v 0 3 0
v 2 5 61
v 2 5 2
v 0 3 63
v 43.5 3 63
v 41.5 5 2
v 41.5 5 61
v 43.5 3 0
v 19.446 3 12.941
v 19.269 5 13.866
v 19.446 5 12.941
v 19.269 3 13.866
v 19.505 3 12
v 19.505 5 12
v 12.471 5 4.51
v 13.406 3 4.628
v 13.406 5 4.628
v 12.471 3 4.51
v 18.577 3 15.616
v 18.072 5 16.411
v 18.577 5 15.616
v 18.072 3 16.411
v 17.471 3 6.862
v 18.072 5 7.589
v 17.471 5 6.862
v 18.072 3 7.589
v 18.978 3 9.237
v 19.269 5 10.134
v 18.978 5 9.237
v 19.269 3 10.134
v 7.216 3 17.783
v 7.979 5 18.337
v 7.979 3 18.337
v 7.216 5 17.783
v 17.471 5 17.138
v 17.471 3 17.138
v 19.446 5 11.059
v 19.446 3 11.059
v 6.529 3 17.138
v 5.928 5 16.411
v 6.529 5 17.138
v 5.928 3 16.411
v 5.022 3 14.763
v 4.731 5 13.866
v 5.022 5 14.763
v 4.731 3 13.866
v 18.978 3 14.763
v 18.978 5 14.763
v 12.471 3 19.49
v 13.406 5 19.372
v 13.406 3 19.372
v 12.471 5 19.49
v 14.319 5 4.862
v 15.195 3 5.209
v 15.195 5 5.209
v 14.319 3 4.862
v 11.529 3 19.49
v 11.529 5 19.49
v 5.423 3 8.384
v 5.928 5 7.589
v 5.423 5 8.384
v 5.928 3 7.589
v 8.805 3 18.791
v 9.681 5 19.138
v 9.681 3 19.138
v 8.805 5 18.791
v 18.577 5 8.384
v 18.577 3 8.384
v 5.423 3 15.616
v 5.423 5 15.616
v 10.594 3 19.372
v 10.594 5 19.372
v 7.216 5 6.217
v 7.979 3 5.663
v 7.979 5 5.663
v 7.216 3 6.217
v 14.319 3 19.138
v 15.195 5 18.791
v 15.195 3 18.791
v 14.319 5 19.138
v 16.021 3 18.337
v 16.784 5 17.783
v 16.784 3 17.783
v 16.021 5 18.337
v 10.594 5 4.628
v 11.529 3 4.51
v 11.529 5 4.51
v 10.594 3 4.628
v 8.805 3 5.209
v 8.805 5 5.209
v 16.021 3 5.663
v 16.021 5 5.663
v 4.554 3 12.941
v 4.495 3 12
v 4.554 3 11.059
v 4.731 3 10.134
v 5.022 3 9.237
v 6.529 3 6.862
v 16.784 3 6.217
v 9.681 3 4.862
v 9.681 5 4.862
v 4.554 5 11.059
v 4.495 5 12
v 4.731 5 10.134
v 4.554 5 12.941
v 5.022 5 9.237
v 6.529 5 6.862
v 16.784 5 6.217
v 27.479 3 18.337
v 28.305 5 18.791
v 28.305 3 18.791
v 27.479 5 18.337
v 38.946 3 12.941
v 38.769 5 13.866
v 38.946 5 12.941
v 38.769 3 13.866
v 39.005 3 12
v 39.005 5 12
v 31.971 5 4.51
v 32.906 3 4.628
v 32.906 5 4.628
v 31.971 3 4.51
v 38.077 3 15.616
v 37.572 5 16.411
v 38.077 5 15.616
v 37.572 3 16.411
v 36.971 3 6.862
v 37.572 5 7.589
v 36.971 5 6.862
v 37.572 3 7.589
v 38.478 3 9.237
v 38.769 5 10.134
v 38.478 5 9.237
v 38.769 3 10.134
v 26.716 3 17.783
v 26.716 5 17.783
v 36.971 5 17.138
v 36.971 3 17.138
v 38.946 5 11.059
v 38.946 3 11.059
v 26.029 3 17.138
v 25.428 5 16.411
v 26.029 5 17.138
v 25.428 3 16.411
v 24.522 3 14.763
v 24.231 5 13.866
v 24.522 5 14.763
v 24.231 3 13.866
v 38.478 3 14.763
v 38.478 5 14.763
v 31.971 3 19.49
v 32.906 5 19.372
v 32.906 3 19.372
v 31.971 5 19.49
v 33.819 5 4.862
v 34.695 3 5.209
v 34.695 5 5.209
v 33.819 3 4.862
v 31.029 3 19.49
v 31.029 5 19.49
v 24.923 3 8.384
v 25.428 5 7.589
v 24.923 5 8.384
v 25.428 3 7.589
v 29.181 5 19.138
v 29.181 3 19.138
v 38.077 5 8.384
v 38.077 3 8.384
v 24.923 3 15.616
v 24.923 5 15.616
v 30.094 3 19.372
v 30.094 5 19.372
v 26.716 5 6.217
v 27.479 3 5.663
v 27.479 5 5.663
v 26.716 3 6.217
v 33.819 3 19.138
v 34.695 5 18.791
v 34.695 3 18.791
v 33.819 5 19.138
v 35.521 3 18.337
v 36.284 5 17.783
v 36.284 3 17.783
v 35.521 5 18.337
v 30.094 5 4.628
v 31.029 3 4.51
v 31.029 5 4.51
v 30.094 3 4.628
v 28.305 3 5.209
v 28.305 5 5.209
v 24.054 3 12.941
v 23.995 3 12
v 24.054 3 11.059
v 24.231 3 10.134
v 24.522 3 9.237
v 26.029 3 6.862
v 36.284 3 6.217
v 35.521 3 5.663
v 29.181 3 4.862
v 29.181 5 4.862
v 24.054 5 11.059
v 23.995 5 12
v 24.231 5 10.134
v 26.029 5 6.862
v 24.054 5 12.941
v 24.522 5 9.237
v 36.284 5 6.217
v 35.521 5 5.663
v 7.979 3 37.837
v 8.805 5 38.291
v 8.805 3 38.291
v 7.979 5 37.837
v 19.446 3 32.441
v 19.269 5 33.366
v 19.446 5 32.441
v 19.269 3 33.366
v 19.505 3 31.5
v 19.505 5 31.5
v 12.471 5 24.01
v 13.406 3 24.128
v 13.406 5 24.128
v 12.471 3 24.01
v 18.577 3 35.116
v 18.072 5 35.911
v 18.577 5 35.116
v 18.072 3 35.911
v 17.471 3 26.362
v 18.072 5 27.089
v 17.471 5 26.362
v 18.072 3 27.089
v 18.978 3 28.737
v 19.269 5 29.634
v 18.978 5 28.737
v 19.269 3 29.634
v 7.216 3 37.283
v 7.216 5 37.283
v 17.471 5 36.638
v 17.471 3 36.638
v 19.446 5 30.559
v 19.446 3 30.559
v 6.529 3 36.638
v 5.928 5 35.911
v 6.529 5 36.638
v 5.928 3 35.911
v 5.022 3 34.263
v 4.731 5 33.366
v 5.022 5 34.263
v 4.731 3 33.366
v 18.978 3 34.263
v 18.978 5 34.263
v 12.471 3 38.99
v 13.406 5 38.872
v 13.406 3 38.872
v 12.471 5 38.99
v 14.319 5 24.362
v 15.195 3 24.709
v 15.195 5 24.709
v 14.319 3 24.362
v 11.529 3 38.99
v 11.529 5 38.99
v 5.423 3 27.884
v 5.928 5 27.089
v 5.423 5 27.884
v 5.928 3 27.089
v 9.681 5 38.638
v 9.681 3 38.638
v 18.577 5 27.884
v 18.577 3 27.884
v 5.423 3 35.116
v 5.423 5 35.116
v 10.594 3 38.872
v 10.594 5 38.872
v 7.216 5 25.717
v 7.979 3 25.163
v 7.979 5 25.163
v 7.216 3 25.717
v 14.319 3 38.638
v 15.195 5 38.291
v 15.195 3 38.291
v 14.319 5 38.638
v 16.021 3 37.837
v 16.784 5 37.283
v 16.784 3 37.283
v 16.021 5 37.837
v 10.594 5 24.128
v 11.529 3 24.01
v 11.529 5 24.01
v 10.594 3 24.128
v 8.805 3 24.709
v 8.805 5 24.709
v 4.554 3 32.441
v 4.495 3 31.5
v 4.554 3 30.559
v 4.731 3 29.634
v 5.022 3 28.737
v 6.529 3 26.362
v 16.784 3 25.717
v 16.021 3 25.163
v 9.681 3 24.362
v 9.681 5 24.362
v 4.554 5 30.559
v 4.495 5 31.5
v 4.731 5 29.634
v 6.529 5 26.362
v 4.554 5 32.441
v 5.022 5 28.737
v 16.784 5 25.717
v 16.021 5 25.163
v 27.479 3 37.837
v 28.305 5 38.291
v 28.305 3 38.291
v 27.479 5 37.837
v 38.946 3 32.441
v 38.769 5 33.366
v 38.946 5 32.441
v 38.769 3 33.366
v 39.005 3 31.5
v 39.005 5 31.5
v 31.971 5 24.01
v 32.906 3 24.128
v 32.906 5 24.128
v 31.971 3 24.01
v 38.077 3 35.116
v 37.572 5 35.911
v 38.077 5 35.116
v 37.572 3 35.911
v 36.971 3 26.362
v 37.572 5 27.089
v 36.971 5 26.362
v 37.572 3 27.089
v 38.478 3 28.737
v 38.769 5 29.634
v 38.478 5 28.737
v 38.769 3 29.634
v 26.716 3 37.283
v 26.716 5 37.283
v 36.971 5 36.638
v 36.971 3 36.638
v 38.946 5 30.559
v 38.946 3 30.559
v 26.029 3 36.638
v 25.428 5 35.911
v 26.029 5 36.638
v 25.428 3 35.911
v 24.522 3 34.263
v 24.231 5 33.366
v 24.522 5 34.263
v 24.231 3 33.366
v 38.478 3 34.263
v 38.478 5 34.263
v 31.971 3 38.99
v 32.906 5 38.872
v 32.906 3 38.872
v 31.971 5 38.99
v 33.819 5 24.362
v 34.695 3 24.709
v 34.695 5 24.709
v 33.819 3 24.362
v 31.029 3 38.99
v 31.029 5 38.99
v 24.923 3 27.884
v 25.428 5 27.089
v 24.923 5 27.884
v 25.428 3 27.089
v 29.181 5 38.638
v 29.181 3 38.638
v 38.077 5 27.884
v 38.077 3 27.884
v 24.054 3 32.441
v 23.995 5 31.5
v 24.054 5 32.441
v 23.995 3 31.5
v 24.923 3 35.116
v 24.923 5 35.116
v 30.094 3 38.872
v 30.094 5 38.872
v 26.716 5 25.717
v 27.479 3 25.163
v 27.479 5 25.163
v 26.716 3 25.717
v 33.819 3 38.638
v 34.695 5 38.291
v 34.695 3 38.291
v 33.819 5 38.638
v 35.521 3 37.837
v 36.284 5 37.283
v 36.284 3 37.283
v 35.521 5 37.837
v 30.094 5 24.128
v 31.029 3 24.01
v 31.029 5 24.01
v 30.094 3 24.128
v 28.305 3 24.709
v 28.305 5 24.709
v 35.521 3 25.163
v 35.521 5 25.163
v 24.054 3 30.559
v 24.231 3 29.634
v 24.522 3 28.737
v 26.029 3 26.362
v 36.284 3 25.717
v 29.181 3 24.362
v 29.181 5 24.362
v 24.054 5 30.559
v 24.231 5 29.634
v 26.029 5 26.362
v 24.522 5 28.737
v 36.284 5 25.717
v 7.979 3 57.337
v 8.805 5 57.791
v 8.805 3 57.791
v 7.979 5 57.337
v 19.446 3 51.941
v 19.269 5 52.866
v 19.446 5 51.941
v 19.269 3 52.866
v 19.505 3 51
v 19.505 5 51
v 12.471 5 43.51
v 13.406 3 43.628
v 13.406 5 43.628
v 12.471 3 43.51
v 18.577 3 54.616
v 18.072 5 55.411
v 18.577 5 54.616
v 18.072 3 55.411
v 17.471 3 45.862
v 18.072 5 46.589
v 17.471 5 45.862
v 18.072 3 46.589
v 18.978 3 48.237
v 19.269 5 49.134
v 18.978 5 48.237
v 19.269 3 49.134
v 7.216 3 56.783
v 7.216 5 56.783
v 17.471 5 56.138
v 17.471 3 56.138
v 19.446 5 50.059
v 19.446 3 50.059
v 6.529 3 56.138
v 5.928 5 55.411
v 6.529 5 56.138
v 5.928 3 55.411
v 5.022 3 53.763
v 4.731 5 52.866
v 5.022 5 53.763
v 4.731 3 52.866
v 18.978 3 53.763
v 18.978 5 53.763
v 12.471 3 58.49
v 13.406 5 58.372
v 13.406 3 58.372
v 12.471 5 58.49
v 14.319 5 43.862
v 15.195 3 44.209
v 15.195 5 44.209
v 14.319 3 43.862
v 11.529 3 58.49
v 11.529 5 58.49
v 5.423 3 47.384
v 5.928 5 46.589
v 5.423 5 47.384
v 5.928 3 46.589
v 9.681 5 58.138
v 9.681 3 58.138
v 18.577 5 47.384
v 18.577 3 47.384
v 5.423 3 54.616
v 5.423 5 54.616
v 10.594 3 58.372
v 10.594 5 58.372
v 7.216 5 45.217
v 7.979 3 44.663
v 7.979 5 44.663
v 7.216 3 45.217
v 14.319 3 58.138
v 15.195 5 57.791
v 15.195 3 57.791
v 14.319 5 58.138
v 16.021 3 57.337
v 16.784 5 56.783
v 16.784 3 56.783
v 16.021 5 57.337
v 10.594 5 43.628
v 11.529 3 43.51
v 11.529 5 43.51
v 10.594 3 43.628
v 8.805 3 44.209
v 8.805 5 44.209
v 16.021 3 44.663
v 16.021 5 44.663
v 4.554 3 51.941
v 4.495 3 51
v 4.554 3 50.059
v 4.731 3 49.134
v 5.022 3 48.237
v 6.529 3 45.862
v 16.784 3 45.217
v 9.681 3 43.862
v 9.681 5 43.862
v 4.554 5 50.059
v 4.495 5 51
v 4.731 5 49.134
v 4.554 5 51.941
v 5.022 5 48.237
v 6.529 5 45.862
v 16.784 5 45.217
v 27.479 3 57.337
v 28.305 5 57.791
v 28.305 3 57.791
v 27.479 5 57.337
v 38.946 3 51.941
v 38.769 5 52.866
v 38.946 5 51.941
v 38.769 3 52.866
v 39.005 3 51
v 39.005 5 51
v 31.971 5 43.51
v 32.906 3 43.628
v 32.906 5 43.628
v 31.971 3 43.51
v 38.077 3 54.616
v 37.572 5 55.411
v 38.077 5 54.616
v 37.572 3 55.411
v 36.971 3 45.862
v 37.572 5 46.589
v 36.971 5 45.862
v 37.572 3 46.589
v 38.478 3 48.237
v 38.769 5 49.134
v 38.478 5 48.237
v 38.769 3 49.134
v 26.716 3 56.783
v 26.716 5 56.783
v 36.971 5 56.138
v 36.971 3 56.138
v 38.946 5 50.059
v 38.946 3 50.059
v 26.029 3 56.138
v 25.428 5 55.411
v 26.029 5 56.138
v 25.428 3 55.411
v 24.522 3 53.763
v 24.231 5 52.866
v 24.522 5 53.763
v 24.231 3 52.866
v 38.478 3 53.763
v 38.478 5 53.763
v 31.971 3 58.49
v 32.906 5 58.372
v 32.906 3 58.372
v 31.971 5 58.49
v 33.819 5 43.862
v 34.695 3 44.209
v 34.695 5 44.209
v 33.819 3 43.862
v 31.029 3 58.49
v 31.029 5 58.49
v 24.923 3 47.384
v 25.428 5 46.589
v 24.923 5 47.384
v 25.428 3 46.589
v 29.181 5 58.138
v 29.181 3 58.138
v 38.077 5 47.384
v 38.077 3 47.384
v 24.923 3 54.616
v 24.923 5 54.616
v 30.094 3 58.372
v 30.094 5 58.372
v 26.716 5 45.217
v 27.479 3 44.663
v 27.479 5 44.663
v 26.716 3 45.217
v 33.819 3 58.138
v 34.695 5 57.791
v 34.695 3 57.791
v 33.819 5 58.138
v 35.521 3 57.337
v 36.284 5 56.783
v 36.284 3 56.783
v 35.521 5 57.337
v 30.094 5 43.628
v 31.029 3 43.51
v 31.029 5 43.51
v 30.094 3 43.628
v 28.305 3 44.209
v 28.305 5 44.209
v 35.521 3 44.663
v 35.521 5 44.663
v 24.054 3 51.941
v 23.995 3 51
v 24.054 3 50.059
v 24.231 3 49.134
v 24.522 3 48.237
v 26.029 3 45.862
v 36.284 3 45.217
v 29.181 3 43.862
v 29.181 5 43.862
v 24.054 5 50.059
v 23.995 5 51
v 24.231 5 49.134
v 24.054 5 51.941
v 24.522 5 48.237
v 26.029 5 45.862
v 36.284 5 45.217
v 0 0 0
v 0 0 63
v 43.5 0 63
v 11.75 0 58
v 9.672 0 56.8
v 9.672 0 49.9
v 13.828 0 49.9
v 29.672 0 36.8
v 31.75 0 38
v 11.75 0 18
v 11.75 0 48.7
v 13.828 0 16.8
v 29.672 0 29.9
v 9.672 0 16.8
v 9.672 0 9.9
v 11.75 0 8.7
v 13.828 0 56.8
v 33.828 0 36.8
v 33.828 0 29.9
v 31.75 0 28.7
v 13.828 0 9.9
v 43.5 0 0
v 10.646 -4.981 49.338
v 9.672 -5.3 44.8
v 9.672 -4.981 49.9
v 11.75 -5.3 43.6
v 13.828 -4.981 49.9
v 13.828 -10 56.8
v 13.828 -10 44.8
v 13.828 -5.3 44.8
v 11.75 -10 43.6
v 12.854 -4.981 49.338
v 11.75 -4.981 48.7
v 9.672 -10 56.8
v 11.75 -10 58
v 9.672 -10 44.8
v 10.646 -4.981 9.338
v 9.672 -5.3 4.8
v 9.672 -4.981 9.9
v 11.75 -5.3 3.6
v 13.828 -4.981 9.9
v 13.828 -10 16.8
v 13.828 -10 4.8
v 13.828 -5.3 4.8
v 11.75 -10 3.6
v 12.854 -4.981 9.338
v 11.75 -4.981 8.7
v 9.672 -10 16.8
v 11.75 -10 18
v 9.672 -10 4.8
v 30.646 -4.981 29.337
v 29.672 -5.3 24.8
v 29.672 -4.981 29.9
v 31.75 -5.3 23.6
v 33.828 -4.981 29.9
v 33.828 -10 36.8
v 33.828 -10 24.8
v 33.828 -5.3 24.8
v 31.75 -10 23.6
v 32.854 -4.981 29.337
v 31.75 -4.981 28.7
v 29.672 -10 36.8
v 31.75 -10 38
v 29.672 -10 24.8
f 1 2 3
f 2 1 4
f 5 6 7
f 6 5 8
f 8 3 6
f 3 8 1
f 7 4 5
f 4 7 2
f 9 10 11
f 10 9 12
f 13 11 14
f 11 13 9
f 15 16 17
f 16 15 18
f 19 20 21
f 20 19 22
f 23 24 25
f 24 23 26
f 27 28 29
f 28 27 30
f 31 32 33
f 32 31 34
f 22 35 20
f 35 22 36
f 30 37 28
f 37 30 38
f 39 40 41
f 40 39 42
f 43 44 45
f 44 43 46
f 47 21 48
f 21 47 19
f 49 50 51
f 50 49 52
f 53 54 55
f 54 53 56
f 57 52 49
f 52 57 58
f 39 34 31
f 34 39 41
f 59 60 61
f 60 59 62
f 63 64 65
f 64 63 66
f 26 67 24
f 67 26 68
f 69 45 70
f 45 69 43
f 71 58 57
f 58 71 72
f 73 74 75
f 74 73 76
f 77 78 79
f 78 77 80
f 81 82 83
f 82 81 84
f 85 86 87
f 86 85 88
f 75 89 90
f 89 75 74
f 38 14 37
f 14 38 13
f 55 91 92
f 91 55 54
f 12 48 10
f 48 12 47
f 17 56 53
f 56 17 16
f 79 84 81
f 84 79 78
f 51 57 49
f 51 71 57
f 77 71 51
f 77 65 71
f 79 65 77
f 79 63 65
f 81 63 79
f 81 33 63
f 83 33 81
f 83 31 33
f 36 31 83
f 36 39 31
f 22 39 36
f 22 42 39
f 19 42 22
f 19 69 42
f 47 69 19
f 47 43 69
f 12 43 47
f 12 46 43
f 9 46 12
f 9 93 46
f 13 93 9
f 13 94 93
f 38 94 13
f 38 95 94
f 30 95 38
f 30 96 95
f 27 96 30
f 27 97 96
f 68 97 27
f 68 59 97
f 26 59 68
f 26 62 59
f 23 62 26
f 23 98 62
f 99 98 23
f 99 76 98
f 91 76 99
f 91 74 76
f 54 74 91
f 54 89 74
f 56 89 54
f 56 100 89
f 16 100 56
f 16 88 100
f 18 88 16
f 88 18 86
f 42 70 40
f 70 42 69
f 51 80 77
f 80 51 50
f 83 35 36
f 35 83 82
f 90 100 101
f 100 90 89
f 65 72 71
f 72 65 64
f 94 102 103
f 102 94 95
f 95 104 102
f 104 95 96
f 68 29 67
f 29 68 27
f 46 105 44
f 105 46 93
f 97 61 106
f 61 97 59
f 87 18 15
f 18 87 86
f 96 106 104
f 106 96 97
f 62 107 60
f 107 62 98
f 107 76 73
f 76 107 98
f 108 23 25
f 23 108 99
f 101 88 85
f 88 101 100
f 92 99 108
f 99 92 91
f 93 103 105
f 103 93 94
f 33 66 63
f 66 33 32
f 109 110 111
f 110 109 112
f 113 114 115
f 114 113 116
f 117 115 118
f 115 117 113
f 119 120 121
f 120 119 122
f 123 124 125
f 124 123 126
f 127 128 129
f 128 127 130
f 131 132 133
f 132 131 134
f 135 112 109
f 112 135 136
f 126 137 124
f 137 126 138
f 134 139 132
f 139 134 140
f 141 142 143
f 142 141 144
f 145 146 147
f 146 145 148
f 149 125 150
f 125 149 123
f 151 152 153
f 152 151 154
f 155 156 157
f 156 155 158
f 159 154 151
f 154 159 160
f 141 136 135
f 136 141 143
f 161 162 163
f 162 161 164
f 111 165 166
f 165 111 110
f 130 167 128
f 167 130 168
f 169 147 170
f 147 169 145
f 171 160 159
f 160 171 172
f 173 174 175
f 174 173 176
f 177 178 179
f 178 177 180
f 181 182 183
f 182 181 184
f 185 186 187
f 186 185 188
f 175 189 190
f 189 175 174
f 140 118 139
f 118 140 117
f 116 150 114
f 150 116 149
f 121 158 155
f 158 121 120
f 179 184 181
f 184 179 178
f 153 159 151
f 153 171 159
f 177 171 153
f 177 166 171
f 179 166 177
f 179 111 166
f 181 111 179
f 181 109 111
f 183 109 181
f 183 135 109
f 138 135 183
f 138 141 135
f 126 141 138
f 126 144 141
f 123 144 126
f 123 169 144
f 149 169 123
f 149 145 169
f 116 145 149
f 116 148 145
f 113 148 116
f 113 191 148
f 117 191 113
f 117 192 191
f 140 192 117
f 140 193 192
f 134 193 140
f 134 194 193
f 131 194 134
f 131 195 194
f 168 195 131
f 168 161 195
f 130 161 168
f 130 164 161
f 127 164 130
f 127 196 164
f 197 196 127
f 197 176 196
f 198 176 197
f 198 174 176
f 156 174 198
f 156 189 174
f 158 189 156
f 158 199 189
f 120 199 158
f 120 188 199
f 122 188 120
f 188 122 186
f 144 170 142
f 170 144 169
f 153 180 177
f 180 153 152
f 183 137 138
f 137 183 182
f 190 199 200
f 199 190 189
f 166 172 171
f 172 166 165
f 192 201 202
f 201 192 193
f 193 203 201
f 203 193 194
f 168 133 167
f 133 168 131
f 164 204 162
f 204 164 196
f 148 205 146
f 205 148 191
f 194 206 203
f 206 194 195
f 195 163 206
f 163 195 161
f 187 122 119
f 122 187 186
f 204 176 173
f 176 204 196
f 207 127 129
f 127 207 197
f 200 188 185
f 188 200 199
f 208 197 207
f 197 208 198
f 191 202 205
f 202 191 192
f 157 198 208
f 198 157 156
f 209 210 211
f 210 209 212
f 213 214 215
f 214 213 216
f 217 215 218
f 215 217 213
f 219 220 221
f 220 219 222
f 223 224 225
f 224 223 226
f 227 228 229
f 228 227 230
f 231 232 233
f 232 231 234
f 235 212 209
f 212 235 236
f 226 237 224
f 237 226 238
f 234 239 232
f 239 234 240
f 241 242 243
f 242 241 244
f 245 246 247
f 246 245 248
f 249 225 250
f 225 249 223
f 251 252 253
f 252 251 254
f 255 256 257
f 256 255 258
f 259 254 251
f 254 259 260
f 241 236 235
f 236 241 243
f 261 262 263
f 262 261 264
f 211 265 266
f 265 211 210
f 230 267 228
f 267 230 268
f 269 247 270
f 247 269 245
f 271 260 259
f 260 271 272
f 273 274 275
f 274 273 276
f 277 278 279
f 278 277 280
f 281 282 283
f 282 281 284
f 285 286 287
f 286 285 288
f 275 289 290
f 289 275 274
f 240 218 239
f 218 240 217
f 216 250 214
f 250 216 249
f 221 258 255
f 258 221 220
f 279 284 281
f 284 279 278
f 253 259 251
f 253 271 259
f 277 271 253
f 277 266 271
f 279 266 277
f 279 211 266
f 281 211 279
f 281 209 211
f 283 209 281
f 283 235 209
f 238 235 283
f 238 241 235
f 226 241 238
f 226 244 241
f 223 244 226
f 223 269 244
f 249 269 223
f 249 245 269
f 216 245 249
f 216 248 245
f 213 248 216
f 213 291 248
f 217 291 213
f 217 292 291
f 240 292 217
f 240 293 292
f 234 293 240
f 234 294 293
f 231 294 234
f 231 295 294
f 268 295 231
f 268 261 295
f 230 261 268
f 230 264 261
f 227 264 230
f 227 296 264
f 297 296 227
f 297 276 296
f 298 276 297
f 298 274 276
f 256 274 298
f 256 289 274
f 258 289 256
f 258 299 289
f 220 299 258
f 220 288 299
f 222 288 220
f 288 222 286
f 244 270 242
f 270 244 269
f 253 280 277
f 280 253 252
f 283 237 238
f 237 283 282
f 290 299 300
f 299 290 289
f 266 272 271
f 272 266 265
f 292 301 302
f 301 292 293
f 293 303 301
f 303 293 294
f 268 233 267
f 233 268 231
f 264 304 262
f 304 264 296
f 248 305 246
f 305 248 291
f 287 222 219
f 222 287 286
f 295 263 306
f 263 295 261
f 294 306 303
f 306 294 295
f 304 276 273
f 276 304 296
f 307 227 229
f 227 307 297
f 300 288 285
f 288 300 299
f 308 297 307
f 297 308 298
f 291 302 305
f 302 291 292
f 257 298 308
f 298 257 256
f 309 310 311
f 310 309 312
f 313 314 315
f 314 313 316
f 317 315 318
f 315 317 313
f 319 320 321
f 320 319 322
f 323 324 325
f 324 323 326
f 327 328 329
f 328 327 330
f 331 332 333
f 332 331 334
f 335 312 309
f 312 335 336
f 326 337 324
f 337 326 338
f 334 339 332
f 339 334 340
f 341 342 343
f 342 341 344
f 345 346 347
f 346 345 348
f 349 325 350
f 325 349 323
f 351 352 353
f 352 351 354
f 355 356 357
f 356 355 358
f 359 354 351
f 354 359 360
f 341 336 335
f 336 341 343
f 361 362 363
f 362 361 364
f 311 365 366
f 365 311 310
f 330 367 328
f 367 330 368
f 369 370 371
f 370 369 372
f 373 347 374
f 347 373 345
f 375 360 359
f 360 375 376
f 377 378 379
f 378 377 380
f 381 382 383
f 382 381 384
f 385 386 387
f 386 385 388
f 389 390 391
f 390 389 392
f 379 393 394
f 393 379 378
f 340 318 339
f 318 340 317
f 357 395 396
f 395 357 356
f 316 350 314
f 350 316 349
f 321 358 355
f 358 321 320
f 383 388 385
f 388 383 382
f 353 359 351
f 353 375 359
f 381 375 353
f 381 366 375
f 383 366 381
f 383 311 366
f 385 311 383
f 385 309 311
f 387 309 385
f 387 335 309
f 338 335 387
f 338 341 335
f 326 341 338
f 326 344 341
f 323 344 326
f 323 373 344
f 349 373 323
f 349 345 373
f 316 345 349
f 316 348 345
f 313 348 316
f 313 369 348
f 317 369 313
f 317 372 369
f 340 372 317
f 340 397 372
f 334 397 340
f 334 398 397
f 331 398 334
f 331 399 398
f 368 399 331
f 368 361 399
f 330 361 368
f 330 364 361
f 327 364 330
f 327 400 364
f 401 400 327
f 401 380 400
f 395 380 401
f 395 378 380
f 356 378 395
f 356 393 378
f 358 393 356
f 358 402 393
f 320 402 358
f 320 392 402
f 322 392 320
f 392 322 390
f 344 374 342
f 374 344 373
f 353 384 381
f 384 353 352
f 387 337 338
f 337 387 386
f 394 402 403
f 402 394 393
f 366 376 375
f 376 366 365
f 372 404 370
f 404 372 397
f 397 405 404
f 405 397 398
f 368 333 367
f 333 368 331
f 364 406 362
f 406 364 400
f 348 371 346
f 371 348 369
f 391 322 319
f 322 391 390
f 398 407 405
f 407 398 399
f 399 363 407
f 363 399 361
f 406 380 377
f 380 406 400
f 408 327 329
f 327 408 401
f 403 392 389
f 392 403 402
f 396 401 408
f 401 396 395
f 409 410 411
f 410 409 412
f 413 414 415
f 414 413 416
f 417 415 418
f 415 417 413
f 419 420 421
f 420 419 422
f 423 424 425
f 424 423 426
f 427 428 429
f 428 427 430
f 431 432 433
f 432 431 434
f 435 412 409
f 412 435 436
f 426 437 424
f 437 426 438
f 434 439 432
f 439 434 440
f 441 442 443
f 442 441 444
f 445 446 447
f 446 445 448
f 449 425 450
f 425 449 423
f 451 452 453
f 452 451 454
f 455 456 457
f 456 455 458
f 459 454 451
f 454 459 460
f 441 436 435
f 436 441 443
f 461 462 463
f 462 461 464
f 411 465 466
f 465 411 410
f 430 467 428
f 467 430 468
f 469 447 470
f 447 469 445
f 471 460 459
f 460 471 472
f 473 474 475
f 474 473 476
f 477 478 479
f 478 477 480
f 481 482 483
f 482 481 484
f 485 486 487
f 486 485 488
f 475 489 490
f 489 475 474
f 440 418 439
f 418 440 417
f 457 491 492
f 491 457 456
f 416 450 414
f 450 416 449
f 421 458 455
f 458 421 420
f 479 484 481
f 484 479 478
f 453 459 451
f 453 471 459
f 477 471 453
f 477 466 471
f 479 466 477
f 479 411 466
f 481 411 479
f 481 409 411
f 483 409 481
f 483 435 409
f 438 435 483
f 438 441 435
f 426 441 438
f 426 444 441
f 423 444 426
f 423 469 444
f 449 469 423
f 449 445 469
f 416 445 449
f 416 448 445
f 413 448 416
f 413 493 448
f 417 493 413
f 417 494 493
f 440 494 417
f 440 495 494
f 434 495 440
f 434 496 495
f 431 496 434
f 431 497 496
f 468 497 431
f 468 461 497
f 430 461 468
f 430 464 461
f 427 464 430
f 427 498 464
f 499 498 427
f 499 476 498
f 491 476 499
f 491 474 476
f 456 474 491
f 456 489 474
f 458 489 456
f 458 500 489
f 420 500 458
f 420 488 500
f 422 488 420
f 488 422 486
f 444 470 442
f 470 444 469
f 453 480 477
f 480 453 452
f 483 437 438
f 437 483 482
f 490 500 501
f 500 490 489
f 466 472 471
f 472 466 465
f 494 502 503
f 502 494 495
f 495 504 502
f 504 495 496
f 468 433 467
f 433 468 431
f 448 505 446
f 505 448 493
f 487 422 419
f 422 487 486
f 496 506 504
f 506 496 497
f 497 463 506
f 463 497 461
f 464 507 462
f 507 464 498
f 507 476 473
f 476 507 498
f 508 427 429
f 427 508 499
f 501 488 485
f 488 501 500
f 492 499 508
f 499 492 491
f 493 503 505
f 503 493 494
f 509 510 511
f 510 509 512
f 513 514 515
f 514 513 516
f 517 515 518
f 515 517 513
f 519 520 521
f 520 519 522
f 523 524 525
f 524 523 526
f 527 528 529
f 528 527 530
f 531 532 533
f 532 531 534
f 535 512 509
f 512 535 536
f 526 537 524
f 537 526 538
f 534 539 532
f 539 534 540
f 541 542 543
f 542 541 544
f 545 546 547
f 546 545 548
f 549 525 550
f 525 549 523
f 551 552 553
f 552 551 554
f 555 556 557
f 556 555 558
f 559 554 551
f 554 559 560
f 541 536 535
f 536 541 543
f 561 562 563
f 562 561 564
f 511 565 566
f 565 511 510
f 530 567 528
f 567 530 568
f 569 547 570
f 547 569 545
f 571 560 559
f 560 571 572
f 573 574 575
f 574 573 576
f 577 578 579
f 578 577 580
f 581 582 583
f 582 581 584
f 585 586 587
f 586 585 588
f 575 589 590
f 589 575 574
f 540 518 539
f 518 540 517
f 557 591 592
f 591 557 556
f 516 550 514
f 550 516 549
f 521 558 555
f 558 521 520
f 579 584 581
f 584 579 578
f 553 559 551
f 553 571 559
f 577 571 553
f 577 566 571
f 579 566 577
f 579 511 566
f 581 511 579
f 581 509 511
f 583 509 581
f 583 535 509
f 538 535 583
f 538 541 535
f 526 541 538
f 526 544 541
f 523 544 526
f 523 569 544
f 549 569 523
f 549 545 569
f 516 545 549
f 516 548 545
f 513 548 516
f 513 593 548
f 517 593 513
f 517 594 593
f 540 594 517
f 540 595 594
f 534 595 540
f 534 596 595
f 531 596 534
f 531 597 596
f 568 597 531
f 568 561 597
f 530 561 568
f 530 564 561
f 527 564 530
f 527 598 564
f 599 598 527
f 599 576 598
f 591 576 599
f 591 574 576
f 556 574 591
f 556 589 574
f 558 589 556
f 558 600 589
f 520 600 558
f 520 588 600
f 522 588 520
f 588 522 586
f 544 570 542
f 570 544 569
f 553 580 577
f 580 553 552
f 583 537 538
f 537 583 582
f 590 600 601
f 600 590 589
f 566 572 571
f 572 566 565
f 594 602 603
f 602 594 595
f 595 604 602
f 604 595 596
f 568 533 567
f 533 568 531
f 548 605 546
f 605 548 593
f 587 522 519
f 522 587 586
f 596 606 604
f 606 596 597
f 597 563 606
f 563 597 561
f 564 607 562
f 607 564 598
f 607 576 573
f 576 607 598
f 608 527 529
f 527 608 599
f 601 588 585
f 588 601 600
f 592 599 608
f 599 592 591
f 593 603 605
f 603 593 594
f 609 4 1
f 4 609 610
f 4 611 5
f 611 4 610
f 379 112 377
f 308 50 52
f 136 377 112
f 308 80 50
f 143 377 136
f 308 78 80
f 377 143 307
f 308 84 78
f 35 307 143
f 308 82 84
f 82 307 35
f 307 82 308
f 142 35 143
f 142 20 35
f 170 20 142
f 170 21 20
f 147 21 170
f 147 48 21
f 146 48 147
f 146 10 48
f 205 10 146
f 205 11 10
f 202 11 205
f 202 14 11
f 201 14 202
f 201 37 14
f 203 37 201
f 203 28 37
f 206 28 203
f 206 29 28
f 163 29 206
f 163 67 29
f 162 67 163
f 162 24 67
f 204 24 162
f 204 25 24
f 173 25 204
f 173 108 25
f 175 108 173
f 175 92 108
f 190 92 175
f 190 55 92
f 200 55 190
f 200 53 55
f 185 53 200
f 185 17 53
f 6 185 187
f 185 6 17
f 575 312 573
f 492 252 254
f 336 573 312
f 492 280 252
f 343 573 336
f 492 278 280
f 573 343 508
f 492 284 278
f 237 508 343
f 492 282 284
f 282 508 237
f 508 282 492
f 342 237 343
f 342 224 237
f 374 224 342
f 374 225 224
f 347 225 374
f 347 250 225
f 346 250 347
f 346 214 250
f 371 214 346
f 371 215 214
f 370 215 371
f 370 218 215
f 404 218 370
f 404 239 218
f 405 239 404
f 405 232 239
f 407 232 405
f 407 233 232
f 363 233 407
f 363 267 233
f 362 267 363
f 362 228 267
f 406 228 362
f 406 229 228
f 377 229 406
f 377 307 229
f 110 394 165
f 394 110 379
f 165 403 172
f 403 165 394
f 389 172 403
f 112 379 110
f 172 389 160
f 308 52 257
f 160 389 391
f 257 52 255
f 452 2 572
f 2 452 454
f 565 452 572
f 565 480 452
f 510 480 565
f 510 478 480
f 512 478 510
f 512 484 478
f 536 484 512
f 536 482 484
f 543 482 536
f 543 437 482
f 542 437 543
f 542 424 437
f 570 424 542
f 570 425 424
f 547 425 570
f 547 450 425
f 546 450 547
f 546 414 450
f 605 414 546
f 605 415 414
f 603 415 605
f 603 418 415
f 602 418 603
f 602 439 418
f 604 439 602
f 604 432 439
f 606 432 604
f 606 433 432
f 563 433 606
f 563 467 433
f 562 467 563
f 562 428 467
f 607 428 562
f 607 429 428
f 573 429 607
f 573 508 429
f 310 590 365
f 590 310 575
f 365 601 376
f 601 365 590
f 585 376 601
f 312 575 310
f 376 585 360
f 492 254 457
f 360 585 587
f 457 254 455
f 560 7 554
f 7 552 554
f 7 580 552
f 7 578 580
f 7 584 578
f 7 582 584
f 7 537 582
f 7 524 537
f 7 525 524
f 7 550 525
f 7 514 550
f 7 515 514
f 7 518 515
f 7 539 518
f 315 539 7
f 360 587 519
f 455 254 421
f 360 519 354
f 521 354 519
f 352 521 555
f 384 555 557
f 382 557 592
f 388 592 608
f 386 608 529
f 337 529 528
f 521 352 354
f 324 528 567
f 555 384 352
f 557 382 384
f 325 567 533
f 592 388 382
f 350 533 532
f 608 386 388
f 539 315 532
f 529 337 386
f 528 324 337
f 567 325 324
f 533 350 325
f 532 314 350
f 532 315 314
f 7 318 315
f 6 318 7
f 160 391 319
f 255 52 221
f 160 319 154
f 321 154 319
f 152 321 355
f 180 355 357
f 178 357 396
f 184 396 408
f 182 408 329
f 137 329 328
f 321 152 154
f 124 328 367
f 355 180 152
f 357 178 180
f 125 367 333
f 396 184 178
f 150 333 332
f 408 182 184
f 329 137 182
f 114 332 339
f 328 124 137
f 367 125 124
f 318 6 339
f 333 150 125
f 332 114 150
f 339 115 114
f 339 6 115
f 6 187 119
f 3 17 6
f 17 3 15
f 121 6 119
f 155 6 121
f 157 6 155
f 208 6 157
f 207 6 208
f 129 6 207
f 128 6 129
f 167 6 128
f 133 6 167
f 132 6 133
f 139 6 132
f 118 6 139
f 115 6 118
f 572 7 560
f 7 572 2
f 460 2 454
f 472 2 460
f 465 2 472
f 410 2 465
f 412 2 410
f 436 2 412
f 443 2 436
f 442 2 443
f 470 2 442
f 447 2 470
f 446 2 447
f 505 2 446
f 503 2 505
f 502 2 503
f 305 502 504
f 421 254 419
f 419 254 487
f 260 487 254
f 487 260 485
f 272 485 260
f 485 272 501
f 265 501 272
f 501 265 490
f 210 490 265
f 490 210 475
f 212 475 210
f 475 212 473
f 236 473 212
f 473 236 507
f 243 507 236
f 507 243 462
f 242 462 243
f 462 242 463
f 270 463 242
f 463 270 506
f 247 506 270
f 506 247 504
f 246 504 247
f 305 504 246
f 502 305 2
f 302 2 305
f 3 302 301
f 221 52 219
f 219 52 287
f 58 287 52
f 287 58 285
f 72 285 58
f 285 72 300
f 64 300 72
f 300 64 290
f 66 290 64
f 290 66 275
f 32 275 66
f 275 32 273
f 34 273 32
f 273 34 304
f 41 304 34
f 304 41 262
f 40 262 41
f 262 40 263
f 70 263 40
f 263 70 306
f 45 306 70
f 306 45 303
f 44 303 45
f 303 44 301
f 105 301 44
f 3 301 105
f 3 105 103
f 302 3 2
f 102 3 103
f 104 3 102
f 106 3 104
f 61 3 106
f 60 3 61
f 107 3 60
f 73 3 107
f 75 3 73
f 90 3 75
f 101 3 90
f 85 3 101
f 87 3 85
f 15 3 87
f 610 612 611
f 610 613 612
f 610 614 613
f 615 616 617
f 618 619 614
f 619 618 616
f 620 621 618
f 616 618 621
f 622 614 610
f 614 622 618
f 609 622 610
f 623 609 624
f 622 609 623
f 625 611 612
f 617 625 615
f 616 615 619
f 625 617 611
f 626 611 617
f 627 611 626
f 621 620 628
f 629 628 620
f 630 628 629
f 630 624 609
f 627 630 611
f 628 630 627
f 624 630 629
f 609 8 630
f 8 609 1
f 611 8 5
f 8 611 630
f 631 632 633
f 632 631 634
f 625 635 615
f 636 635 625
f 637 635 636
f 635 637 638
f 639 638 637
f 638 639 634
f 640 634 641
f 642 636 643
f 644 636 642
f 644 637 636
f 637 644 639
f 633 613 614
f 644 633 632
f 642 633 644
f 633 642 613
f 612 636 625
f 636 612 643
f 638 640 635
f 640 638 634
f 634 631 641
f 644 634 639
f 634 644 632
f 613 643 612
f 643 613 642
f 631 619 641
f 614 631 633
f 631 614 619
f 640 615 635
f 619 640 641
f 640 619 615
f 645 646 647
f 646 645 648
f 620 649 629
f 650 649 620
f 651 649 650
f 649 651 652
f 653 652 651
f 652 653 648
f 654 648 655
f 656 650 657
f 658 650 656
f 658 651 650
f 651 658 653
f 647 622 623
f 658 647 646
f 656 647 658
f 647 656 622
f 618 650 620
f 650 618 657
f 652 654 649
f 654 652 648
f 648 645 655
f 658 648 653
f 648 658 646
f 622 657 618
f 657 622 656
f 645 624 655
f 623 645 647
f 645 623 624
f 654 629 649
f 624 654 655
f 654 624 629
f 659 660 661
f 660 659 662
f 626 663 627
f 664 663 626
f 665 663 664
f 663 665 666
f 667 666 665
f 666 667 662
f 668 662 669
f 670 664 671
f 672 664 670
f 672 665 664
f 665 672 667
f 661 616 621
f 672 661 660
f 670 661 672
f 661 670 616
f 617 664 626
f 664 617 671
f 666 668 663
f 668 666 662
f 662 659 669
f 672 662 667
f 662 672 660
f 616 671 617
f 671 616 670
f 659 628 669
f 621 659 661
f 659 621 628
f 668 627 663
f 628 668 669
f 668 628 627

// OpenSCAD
// Customisable magnet holder for IKEA Sakdis pegboards
// Author: Kevin Golding

// Number of rows
mRows = 3; // [1:1:24]

// Number of columns
mCols = 2; // [1:1:24]

// Magnet thickness
mDepth = 2; // 0.1

// Magnet diameter
mDia = 15; // 0.1

// Oversize magnet diameter to fine tune the fit
mOffset = 0.01; // 0.01

// Spacing between magnets
s = 4.5; // [0.5:0.1:20]

// Chamfer size
chamfer=2; // [0:0.1:5]

// Plate thickness (behind magnets)
plateT=3;   // [1:0.1:10]

/* [Hidden] */
$fn = 50;

/* [Hidden] */
// tiny is used to ensure preview works as well as render by making masks overlap a little
tiny=0.001;
tiny2=tiny*2;

assert(mOffset < s - chamfer, "Offset must be smaller than the Spacing less the chamfer");

body(mRows,mCols,chamfer);

// Tests
//translate([100,00,0]) {
//  translate([0,00,0]) body(1,1);
//  translate([30,30,0]) body(2,1);
//  translate([60,60,0]) body(2,2);
//  translate([0,90,0]) body(3,1);
//  translate([30,120,0]) body(3,2);
//  translate([60,150,0]) body(3,3);
//  translate([0,180,0]) body(4,1);
//  translate([30,210,0]) body(4,2);
//  translate([60,240,0]) body(4,3);
//  translate([90,270,0]) body(4,4);
//};

module body(rows, cols, chamfer=2) {
  // Width
  w = (mDia + s) * cols + s;
  // Height
  h = (mDia + s) * rows + s;
  // Depth
  d = plateT + mDepth;
  
  assert(chamfer < d, "Chamfer too large!");
  
  difference() {
    hull() {
        cube([w, d, h]);
    }
    
    c2 = chamfer * 2;

    if (chamfer > 0) {
      // Chamfers
      translate([0,d-chamfer,-tiny]) rotate([0, 0, 45]) cube([c2,c2,h+tiny2]); // Right
      translate([w,d-chamfer,-tiny]) rotate([0, 0, 45]) cube([c2,c2,h+tiny2]); // Left
      translate([0,d-chamfer,0]) rotate([0, 90, 0]) rotate([0, 0, 45]) cube([c2,c2,w+tiny2]); // Bottom
      translate([0,d-chamfer,h]) rotate([0, 90, 0]) rotate([0, 0, 45]) cube([c2,c2,w+tiny2]); // Top
    }
    
    // Magnets
    for (row=[0:1:rows-1]) {
      for (col=[0:1:cols-1]) {
        translate([s+mDia/2+col*(mDia+s),d+tiny,mDia/2 + s + row*(mDia+s)]) rotate([90,0,0]) cylinder(d=mDia+mOffset, h=mDepth+tiny);
      }
    }
  }
  hooks(w, h);
}

module hooks(w, h) {
  echo("=== HOOKS()", w, h);
  hookCols = ceil((w-5) / 20);
  hookRows = ceil((h-15) / 20);
  echo("hookCols, hookRows", hookCols, hookRows);

  // Center by width
  offsetX = (w-((hookCols-1) * 20))/2;
  oddX = hookRows == 100 ? 10 : 0;
  echo("offsetX:", offsetX, "oddX:", oddX);
  // Vertically we start 5 mm from the top and work down
  offsetTop = 5;
  for (x=[offsetX:40:w-5]) {
    for (z=[0:40:h-15]) {
      translate([x+oddX, 0, h-offsetTop-z]) hook();
    };
  };
  for (x=[20:40:w-5]) {
    for (z=[20:40:h-15]) {
      translate([offsetX+x, 0, h-offsetTop-z]) hook();
    };
  };
}

module hook() {
  // t is the amount we reduce the width/height by to let it fit ok
  t = 0.1;
  // w = width
  w = 5;
  // wt is the width less the t
  wt = w - t * 2;
  // h is the hight less a bit to make it fit
  h = 15 - 0.3;
  // h2 is the height of the smaller part of the peg
  h2 = h - 5;
  // ht is the height less t
  ht = h - t;
  // d is the depth of the board
  d = 5;
  // 12 gives us enough facets to create a easy to print angle
  $fn = 6;

  translate([0, -d*2, -wt/2]) rotate([270, 90,0]) union() {
    // The larger part of the peg
    hull() {
      cylinder(d=wt, h=d + 0.3);
      // -0.3 is the taper applied to the face that makes contact with the back on the pegboard
      translate([ht-w, 0, 0]) cylinder(d=wt, h=d -0.3);
    }
    // The smaller part of the peg
    translate([0, 0, 0]) hull() {
      cylinder(d=wt, h = d * 2);
      translate([h2 - w - t * 2 ,0 ,0]) cylinder(d=wt, h=d * 2);
      };
  }
}
